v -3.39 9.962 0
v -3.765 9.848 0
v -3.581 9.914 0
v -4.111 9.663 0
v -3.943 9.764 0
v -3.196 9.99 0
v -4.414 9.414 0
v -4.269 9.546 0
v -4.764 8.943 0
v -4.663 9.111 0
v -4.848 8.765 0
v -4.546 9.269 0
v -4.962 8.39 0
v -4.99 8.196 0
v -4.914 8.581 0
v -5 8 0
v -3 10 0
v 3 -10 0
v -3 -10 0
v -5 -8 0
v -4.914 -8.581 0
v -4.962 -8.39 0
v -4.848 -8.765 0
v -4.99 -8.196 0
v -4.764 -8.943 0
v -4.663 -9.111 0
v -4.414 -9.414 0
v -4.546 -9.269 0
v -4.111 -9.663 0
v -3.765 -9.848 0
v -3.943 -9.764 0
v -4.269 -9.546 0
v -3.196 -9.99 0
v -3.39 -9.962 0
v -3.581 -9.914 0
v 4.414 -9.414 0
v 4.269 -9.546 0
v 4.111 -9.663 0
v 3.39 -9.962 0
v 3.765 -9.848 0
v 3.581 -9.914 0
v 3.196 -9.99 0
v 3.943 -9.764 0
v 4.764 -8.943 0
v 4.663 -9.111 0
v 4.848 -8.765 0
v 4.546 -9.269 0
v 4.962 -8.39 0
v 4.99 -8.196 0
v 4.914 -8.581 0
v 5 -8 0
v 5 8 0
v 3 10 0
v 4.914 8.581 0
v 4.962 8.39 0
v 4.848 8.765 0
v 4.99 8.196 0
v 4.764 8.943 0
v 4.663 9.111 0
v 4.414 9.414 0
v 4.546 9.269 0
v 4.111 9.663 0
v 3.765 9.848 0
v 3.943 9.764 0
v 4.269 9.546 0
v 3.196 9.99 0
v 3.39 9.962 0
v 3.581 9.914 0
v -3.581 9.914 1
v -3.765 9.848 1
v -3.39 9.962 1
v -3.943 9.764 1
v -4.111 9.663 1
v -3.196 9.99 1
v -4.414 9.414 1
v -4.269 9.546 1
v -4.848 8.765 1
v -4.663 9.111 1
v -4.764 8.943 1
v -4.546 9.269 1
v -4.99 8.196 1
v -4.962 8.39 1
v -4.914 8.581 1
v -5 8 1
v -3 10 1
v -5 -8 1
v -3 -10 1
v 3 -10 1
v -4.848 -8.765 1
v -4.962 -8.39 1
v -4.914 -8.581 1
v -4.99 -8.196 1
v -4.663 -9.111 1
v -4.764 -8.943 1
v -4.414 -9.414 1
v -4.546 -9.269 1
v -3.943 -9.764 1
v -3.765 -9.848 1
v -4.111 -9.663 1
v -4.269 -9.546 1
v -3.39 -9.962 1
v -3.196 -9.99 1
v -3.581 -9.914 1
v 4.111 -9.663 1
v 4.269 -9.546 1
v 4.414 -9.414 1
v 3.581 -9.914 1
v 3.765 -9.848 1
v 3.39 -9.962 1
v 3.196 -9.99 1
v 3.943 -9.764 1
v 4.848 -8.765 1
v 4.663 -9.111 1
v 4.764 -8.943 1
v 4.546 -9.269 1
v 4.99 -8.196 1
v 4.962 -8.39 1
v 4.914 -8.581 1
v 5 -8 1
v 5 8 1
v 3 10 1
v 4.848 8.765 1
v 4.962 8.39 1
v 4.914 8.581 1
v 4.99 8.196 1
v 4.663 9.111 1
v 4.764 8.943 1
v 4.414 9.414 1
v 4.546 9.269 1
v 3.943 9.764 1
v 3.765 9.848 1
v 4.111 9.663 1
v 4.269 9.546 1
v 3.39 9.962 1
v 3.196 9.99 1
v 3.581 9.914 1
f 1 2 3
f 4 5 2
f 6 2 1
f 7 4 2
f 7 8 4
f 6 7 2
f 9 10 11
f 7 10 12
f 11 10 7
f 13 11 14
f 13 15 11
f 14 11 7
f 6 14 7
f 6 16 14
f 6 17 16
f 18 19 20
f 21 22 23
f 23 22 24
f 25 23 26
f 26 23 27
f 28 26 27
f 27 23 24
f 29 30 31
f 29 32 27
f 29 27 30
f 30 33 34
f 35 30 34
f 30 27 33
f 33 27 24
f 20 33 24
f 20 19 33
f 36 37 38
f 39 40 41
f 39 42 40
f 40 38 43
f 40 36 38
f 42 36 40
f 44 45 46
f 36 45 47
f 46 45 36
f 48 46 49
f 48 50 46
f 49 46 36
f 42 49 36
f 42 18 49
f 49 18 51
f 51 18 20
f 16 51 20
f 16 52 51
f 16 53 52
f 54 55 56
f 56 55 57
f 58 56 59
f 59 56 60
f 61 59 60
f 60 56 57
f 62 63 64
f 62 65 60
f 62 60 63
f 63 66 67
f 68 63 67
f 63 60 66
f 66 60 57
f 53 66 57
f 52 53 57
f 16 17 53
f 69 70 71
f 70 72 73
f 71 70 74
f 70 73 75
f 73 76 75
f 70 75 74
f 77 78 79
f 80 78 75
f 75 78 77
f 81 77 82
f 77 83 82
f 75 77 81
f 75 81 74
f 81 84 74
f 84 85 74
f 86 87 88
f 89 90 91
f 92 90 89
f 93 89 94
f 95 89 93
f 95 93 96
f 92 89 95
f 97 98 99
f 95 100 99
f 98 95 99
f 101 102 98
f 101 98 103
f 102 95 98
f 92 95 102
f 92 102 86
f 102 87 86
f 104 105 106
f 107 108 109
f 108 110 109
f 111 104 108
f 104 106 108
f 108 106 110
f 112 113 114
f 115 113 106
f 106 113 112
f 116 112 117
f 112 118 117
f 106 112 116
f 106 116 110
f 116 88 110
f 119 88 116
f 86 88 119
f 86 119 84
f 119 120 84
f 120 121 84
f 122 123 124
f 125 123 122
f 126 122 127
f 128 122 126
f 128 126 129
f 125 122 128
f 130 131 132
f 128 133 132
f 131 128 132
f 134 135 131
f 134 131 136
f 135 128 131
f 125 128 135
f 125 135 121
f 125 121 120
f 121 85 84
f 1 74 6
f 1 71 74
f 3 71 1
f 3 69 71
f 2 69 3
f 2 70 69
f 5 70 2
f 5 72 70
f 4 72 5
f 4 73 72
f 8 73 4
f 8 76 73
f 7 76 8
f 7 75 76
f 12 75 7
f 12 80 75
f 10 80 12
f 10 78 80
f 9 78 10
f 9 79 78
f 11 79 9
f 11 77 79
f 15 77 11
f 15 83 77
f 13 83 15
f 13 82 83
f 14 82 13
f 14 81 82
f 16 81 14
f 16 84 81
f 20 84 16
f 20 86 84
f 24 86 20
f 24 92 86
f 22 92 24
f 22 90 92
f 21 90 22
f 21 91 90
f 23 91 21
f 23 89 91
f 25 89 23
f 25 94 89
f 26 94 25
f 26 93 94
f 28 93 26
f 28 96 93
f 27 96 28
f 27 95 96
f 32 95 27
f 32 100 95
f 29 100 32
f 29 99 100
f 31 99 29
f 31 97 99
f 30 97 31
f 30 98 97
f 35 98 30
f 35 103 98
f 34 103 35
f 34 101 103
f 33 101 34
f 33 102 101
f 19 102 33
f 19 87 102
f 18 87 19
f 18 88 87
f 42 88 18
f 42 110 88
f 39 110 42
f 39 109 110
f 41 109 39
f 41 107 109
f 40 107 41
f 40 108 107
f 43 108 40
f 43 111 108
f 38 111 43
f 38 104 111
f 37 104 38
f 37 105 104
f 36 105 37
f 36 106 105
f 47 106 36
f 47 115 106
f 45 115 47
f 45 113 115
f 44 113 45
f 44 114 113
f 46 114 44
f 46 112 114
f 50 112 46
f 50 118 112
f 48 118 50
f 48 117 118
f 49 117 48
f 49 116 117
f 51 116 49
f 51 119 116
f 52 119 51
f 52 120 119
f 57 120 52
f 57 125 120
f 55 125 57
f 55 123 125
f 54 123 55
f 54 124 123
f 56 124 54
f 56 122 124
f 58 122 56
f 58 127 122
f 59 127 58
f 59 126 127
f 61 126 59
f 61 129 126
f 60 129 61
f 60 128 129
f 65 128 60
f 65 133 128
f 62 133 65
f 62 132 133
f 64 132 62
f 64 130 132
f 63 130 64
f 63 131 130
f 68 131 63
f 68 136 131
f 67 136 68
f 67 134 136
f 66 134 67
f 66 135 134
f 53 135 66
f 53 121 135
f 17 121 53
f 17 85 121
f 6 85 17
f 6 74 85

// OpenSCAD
$fn = 64;

linear_extrude(0, 0, 1) roundedRect(10, 20, 2);

module roundedRect(w, h, r) {
    square([w - 2 * r, h], center = true);
    square([w, h - 2 * r], center = true);
    translate([w/2 - r, h/2 - r, 0]) circle(r = r);
    translate([-(w/2 - r), h/2 - r, 0]) circle(r = r);
    translate([w/2 - r, -(h/2 - r), 0]) circle(r = r);
    translate([-(w/2 - r), -(h/2 - r), 0]) circle(r = r);
}
